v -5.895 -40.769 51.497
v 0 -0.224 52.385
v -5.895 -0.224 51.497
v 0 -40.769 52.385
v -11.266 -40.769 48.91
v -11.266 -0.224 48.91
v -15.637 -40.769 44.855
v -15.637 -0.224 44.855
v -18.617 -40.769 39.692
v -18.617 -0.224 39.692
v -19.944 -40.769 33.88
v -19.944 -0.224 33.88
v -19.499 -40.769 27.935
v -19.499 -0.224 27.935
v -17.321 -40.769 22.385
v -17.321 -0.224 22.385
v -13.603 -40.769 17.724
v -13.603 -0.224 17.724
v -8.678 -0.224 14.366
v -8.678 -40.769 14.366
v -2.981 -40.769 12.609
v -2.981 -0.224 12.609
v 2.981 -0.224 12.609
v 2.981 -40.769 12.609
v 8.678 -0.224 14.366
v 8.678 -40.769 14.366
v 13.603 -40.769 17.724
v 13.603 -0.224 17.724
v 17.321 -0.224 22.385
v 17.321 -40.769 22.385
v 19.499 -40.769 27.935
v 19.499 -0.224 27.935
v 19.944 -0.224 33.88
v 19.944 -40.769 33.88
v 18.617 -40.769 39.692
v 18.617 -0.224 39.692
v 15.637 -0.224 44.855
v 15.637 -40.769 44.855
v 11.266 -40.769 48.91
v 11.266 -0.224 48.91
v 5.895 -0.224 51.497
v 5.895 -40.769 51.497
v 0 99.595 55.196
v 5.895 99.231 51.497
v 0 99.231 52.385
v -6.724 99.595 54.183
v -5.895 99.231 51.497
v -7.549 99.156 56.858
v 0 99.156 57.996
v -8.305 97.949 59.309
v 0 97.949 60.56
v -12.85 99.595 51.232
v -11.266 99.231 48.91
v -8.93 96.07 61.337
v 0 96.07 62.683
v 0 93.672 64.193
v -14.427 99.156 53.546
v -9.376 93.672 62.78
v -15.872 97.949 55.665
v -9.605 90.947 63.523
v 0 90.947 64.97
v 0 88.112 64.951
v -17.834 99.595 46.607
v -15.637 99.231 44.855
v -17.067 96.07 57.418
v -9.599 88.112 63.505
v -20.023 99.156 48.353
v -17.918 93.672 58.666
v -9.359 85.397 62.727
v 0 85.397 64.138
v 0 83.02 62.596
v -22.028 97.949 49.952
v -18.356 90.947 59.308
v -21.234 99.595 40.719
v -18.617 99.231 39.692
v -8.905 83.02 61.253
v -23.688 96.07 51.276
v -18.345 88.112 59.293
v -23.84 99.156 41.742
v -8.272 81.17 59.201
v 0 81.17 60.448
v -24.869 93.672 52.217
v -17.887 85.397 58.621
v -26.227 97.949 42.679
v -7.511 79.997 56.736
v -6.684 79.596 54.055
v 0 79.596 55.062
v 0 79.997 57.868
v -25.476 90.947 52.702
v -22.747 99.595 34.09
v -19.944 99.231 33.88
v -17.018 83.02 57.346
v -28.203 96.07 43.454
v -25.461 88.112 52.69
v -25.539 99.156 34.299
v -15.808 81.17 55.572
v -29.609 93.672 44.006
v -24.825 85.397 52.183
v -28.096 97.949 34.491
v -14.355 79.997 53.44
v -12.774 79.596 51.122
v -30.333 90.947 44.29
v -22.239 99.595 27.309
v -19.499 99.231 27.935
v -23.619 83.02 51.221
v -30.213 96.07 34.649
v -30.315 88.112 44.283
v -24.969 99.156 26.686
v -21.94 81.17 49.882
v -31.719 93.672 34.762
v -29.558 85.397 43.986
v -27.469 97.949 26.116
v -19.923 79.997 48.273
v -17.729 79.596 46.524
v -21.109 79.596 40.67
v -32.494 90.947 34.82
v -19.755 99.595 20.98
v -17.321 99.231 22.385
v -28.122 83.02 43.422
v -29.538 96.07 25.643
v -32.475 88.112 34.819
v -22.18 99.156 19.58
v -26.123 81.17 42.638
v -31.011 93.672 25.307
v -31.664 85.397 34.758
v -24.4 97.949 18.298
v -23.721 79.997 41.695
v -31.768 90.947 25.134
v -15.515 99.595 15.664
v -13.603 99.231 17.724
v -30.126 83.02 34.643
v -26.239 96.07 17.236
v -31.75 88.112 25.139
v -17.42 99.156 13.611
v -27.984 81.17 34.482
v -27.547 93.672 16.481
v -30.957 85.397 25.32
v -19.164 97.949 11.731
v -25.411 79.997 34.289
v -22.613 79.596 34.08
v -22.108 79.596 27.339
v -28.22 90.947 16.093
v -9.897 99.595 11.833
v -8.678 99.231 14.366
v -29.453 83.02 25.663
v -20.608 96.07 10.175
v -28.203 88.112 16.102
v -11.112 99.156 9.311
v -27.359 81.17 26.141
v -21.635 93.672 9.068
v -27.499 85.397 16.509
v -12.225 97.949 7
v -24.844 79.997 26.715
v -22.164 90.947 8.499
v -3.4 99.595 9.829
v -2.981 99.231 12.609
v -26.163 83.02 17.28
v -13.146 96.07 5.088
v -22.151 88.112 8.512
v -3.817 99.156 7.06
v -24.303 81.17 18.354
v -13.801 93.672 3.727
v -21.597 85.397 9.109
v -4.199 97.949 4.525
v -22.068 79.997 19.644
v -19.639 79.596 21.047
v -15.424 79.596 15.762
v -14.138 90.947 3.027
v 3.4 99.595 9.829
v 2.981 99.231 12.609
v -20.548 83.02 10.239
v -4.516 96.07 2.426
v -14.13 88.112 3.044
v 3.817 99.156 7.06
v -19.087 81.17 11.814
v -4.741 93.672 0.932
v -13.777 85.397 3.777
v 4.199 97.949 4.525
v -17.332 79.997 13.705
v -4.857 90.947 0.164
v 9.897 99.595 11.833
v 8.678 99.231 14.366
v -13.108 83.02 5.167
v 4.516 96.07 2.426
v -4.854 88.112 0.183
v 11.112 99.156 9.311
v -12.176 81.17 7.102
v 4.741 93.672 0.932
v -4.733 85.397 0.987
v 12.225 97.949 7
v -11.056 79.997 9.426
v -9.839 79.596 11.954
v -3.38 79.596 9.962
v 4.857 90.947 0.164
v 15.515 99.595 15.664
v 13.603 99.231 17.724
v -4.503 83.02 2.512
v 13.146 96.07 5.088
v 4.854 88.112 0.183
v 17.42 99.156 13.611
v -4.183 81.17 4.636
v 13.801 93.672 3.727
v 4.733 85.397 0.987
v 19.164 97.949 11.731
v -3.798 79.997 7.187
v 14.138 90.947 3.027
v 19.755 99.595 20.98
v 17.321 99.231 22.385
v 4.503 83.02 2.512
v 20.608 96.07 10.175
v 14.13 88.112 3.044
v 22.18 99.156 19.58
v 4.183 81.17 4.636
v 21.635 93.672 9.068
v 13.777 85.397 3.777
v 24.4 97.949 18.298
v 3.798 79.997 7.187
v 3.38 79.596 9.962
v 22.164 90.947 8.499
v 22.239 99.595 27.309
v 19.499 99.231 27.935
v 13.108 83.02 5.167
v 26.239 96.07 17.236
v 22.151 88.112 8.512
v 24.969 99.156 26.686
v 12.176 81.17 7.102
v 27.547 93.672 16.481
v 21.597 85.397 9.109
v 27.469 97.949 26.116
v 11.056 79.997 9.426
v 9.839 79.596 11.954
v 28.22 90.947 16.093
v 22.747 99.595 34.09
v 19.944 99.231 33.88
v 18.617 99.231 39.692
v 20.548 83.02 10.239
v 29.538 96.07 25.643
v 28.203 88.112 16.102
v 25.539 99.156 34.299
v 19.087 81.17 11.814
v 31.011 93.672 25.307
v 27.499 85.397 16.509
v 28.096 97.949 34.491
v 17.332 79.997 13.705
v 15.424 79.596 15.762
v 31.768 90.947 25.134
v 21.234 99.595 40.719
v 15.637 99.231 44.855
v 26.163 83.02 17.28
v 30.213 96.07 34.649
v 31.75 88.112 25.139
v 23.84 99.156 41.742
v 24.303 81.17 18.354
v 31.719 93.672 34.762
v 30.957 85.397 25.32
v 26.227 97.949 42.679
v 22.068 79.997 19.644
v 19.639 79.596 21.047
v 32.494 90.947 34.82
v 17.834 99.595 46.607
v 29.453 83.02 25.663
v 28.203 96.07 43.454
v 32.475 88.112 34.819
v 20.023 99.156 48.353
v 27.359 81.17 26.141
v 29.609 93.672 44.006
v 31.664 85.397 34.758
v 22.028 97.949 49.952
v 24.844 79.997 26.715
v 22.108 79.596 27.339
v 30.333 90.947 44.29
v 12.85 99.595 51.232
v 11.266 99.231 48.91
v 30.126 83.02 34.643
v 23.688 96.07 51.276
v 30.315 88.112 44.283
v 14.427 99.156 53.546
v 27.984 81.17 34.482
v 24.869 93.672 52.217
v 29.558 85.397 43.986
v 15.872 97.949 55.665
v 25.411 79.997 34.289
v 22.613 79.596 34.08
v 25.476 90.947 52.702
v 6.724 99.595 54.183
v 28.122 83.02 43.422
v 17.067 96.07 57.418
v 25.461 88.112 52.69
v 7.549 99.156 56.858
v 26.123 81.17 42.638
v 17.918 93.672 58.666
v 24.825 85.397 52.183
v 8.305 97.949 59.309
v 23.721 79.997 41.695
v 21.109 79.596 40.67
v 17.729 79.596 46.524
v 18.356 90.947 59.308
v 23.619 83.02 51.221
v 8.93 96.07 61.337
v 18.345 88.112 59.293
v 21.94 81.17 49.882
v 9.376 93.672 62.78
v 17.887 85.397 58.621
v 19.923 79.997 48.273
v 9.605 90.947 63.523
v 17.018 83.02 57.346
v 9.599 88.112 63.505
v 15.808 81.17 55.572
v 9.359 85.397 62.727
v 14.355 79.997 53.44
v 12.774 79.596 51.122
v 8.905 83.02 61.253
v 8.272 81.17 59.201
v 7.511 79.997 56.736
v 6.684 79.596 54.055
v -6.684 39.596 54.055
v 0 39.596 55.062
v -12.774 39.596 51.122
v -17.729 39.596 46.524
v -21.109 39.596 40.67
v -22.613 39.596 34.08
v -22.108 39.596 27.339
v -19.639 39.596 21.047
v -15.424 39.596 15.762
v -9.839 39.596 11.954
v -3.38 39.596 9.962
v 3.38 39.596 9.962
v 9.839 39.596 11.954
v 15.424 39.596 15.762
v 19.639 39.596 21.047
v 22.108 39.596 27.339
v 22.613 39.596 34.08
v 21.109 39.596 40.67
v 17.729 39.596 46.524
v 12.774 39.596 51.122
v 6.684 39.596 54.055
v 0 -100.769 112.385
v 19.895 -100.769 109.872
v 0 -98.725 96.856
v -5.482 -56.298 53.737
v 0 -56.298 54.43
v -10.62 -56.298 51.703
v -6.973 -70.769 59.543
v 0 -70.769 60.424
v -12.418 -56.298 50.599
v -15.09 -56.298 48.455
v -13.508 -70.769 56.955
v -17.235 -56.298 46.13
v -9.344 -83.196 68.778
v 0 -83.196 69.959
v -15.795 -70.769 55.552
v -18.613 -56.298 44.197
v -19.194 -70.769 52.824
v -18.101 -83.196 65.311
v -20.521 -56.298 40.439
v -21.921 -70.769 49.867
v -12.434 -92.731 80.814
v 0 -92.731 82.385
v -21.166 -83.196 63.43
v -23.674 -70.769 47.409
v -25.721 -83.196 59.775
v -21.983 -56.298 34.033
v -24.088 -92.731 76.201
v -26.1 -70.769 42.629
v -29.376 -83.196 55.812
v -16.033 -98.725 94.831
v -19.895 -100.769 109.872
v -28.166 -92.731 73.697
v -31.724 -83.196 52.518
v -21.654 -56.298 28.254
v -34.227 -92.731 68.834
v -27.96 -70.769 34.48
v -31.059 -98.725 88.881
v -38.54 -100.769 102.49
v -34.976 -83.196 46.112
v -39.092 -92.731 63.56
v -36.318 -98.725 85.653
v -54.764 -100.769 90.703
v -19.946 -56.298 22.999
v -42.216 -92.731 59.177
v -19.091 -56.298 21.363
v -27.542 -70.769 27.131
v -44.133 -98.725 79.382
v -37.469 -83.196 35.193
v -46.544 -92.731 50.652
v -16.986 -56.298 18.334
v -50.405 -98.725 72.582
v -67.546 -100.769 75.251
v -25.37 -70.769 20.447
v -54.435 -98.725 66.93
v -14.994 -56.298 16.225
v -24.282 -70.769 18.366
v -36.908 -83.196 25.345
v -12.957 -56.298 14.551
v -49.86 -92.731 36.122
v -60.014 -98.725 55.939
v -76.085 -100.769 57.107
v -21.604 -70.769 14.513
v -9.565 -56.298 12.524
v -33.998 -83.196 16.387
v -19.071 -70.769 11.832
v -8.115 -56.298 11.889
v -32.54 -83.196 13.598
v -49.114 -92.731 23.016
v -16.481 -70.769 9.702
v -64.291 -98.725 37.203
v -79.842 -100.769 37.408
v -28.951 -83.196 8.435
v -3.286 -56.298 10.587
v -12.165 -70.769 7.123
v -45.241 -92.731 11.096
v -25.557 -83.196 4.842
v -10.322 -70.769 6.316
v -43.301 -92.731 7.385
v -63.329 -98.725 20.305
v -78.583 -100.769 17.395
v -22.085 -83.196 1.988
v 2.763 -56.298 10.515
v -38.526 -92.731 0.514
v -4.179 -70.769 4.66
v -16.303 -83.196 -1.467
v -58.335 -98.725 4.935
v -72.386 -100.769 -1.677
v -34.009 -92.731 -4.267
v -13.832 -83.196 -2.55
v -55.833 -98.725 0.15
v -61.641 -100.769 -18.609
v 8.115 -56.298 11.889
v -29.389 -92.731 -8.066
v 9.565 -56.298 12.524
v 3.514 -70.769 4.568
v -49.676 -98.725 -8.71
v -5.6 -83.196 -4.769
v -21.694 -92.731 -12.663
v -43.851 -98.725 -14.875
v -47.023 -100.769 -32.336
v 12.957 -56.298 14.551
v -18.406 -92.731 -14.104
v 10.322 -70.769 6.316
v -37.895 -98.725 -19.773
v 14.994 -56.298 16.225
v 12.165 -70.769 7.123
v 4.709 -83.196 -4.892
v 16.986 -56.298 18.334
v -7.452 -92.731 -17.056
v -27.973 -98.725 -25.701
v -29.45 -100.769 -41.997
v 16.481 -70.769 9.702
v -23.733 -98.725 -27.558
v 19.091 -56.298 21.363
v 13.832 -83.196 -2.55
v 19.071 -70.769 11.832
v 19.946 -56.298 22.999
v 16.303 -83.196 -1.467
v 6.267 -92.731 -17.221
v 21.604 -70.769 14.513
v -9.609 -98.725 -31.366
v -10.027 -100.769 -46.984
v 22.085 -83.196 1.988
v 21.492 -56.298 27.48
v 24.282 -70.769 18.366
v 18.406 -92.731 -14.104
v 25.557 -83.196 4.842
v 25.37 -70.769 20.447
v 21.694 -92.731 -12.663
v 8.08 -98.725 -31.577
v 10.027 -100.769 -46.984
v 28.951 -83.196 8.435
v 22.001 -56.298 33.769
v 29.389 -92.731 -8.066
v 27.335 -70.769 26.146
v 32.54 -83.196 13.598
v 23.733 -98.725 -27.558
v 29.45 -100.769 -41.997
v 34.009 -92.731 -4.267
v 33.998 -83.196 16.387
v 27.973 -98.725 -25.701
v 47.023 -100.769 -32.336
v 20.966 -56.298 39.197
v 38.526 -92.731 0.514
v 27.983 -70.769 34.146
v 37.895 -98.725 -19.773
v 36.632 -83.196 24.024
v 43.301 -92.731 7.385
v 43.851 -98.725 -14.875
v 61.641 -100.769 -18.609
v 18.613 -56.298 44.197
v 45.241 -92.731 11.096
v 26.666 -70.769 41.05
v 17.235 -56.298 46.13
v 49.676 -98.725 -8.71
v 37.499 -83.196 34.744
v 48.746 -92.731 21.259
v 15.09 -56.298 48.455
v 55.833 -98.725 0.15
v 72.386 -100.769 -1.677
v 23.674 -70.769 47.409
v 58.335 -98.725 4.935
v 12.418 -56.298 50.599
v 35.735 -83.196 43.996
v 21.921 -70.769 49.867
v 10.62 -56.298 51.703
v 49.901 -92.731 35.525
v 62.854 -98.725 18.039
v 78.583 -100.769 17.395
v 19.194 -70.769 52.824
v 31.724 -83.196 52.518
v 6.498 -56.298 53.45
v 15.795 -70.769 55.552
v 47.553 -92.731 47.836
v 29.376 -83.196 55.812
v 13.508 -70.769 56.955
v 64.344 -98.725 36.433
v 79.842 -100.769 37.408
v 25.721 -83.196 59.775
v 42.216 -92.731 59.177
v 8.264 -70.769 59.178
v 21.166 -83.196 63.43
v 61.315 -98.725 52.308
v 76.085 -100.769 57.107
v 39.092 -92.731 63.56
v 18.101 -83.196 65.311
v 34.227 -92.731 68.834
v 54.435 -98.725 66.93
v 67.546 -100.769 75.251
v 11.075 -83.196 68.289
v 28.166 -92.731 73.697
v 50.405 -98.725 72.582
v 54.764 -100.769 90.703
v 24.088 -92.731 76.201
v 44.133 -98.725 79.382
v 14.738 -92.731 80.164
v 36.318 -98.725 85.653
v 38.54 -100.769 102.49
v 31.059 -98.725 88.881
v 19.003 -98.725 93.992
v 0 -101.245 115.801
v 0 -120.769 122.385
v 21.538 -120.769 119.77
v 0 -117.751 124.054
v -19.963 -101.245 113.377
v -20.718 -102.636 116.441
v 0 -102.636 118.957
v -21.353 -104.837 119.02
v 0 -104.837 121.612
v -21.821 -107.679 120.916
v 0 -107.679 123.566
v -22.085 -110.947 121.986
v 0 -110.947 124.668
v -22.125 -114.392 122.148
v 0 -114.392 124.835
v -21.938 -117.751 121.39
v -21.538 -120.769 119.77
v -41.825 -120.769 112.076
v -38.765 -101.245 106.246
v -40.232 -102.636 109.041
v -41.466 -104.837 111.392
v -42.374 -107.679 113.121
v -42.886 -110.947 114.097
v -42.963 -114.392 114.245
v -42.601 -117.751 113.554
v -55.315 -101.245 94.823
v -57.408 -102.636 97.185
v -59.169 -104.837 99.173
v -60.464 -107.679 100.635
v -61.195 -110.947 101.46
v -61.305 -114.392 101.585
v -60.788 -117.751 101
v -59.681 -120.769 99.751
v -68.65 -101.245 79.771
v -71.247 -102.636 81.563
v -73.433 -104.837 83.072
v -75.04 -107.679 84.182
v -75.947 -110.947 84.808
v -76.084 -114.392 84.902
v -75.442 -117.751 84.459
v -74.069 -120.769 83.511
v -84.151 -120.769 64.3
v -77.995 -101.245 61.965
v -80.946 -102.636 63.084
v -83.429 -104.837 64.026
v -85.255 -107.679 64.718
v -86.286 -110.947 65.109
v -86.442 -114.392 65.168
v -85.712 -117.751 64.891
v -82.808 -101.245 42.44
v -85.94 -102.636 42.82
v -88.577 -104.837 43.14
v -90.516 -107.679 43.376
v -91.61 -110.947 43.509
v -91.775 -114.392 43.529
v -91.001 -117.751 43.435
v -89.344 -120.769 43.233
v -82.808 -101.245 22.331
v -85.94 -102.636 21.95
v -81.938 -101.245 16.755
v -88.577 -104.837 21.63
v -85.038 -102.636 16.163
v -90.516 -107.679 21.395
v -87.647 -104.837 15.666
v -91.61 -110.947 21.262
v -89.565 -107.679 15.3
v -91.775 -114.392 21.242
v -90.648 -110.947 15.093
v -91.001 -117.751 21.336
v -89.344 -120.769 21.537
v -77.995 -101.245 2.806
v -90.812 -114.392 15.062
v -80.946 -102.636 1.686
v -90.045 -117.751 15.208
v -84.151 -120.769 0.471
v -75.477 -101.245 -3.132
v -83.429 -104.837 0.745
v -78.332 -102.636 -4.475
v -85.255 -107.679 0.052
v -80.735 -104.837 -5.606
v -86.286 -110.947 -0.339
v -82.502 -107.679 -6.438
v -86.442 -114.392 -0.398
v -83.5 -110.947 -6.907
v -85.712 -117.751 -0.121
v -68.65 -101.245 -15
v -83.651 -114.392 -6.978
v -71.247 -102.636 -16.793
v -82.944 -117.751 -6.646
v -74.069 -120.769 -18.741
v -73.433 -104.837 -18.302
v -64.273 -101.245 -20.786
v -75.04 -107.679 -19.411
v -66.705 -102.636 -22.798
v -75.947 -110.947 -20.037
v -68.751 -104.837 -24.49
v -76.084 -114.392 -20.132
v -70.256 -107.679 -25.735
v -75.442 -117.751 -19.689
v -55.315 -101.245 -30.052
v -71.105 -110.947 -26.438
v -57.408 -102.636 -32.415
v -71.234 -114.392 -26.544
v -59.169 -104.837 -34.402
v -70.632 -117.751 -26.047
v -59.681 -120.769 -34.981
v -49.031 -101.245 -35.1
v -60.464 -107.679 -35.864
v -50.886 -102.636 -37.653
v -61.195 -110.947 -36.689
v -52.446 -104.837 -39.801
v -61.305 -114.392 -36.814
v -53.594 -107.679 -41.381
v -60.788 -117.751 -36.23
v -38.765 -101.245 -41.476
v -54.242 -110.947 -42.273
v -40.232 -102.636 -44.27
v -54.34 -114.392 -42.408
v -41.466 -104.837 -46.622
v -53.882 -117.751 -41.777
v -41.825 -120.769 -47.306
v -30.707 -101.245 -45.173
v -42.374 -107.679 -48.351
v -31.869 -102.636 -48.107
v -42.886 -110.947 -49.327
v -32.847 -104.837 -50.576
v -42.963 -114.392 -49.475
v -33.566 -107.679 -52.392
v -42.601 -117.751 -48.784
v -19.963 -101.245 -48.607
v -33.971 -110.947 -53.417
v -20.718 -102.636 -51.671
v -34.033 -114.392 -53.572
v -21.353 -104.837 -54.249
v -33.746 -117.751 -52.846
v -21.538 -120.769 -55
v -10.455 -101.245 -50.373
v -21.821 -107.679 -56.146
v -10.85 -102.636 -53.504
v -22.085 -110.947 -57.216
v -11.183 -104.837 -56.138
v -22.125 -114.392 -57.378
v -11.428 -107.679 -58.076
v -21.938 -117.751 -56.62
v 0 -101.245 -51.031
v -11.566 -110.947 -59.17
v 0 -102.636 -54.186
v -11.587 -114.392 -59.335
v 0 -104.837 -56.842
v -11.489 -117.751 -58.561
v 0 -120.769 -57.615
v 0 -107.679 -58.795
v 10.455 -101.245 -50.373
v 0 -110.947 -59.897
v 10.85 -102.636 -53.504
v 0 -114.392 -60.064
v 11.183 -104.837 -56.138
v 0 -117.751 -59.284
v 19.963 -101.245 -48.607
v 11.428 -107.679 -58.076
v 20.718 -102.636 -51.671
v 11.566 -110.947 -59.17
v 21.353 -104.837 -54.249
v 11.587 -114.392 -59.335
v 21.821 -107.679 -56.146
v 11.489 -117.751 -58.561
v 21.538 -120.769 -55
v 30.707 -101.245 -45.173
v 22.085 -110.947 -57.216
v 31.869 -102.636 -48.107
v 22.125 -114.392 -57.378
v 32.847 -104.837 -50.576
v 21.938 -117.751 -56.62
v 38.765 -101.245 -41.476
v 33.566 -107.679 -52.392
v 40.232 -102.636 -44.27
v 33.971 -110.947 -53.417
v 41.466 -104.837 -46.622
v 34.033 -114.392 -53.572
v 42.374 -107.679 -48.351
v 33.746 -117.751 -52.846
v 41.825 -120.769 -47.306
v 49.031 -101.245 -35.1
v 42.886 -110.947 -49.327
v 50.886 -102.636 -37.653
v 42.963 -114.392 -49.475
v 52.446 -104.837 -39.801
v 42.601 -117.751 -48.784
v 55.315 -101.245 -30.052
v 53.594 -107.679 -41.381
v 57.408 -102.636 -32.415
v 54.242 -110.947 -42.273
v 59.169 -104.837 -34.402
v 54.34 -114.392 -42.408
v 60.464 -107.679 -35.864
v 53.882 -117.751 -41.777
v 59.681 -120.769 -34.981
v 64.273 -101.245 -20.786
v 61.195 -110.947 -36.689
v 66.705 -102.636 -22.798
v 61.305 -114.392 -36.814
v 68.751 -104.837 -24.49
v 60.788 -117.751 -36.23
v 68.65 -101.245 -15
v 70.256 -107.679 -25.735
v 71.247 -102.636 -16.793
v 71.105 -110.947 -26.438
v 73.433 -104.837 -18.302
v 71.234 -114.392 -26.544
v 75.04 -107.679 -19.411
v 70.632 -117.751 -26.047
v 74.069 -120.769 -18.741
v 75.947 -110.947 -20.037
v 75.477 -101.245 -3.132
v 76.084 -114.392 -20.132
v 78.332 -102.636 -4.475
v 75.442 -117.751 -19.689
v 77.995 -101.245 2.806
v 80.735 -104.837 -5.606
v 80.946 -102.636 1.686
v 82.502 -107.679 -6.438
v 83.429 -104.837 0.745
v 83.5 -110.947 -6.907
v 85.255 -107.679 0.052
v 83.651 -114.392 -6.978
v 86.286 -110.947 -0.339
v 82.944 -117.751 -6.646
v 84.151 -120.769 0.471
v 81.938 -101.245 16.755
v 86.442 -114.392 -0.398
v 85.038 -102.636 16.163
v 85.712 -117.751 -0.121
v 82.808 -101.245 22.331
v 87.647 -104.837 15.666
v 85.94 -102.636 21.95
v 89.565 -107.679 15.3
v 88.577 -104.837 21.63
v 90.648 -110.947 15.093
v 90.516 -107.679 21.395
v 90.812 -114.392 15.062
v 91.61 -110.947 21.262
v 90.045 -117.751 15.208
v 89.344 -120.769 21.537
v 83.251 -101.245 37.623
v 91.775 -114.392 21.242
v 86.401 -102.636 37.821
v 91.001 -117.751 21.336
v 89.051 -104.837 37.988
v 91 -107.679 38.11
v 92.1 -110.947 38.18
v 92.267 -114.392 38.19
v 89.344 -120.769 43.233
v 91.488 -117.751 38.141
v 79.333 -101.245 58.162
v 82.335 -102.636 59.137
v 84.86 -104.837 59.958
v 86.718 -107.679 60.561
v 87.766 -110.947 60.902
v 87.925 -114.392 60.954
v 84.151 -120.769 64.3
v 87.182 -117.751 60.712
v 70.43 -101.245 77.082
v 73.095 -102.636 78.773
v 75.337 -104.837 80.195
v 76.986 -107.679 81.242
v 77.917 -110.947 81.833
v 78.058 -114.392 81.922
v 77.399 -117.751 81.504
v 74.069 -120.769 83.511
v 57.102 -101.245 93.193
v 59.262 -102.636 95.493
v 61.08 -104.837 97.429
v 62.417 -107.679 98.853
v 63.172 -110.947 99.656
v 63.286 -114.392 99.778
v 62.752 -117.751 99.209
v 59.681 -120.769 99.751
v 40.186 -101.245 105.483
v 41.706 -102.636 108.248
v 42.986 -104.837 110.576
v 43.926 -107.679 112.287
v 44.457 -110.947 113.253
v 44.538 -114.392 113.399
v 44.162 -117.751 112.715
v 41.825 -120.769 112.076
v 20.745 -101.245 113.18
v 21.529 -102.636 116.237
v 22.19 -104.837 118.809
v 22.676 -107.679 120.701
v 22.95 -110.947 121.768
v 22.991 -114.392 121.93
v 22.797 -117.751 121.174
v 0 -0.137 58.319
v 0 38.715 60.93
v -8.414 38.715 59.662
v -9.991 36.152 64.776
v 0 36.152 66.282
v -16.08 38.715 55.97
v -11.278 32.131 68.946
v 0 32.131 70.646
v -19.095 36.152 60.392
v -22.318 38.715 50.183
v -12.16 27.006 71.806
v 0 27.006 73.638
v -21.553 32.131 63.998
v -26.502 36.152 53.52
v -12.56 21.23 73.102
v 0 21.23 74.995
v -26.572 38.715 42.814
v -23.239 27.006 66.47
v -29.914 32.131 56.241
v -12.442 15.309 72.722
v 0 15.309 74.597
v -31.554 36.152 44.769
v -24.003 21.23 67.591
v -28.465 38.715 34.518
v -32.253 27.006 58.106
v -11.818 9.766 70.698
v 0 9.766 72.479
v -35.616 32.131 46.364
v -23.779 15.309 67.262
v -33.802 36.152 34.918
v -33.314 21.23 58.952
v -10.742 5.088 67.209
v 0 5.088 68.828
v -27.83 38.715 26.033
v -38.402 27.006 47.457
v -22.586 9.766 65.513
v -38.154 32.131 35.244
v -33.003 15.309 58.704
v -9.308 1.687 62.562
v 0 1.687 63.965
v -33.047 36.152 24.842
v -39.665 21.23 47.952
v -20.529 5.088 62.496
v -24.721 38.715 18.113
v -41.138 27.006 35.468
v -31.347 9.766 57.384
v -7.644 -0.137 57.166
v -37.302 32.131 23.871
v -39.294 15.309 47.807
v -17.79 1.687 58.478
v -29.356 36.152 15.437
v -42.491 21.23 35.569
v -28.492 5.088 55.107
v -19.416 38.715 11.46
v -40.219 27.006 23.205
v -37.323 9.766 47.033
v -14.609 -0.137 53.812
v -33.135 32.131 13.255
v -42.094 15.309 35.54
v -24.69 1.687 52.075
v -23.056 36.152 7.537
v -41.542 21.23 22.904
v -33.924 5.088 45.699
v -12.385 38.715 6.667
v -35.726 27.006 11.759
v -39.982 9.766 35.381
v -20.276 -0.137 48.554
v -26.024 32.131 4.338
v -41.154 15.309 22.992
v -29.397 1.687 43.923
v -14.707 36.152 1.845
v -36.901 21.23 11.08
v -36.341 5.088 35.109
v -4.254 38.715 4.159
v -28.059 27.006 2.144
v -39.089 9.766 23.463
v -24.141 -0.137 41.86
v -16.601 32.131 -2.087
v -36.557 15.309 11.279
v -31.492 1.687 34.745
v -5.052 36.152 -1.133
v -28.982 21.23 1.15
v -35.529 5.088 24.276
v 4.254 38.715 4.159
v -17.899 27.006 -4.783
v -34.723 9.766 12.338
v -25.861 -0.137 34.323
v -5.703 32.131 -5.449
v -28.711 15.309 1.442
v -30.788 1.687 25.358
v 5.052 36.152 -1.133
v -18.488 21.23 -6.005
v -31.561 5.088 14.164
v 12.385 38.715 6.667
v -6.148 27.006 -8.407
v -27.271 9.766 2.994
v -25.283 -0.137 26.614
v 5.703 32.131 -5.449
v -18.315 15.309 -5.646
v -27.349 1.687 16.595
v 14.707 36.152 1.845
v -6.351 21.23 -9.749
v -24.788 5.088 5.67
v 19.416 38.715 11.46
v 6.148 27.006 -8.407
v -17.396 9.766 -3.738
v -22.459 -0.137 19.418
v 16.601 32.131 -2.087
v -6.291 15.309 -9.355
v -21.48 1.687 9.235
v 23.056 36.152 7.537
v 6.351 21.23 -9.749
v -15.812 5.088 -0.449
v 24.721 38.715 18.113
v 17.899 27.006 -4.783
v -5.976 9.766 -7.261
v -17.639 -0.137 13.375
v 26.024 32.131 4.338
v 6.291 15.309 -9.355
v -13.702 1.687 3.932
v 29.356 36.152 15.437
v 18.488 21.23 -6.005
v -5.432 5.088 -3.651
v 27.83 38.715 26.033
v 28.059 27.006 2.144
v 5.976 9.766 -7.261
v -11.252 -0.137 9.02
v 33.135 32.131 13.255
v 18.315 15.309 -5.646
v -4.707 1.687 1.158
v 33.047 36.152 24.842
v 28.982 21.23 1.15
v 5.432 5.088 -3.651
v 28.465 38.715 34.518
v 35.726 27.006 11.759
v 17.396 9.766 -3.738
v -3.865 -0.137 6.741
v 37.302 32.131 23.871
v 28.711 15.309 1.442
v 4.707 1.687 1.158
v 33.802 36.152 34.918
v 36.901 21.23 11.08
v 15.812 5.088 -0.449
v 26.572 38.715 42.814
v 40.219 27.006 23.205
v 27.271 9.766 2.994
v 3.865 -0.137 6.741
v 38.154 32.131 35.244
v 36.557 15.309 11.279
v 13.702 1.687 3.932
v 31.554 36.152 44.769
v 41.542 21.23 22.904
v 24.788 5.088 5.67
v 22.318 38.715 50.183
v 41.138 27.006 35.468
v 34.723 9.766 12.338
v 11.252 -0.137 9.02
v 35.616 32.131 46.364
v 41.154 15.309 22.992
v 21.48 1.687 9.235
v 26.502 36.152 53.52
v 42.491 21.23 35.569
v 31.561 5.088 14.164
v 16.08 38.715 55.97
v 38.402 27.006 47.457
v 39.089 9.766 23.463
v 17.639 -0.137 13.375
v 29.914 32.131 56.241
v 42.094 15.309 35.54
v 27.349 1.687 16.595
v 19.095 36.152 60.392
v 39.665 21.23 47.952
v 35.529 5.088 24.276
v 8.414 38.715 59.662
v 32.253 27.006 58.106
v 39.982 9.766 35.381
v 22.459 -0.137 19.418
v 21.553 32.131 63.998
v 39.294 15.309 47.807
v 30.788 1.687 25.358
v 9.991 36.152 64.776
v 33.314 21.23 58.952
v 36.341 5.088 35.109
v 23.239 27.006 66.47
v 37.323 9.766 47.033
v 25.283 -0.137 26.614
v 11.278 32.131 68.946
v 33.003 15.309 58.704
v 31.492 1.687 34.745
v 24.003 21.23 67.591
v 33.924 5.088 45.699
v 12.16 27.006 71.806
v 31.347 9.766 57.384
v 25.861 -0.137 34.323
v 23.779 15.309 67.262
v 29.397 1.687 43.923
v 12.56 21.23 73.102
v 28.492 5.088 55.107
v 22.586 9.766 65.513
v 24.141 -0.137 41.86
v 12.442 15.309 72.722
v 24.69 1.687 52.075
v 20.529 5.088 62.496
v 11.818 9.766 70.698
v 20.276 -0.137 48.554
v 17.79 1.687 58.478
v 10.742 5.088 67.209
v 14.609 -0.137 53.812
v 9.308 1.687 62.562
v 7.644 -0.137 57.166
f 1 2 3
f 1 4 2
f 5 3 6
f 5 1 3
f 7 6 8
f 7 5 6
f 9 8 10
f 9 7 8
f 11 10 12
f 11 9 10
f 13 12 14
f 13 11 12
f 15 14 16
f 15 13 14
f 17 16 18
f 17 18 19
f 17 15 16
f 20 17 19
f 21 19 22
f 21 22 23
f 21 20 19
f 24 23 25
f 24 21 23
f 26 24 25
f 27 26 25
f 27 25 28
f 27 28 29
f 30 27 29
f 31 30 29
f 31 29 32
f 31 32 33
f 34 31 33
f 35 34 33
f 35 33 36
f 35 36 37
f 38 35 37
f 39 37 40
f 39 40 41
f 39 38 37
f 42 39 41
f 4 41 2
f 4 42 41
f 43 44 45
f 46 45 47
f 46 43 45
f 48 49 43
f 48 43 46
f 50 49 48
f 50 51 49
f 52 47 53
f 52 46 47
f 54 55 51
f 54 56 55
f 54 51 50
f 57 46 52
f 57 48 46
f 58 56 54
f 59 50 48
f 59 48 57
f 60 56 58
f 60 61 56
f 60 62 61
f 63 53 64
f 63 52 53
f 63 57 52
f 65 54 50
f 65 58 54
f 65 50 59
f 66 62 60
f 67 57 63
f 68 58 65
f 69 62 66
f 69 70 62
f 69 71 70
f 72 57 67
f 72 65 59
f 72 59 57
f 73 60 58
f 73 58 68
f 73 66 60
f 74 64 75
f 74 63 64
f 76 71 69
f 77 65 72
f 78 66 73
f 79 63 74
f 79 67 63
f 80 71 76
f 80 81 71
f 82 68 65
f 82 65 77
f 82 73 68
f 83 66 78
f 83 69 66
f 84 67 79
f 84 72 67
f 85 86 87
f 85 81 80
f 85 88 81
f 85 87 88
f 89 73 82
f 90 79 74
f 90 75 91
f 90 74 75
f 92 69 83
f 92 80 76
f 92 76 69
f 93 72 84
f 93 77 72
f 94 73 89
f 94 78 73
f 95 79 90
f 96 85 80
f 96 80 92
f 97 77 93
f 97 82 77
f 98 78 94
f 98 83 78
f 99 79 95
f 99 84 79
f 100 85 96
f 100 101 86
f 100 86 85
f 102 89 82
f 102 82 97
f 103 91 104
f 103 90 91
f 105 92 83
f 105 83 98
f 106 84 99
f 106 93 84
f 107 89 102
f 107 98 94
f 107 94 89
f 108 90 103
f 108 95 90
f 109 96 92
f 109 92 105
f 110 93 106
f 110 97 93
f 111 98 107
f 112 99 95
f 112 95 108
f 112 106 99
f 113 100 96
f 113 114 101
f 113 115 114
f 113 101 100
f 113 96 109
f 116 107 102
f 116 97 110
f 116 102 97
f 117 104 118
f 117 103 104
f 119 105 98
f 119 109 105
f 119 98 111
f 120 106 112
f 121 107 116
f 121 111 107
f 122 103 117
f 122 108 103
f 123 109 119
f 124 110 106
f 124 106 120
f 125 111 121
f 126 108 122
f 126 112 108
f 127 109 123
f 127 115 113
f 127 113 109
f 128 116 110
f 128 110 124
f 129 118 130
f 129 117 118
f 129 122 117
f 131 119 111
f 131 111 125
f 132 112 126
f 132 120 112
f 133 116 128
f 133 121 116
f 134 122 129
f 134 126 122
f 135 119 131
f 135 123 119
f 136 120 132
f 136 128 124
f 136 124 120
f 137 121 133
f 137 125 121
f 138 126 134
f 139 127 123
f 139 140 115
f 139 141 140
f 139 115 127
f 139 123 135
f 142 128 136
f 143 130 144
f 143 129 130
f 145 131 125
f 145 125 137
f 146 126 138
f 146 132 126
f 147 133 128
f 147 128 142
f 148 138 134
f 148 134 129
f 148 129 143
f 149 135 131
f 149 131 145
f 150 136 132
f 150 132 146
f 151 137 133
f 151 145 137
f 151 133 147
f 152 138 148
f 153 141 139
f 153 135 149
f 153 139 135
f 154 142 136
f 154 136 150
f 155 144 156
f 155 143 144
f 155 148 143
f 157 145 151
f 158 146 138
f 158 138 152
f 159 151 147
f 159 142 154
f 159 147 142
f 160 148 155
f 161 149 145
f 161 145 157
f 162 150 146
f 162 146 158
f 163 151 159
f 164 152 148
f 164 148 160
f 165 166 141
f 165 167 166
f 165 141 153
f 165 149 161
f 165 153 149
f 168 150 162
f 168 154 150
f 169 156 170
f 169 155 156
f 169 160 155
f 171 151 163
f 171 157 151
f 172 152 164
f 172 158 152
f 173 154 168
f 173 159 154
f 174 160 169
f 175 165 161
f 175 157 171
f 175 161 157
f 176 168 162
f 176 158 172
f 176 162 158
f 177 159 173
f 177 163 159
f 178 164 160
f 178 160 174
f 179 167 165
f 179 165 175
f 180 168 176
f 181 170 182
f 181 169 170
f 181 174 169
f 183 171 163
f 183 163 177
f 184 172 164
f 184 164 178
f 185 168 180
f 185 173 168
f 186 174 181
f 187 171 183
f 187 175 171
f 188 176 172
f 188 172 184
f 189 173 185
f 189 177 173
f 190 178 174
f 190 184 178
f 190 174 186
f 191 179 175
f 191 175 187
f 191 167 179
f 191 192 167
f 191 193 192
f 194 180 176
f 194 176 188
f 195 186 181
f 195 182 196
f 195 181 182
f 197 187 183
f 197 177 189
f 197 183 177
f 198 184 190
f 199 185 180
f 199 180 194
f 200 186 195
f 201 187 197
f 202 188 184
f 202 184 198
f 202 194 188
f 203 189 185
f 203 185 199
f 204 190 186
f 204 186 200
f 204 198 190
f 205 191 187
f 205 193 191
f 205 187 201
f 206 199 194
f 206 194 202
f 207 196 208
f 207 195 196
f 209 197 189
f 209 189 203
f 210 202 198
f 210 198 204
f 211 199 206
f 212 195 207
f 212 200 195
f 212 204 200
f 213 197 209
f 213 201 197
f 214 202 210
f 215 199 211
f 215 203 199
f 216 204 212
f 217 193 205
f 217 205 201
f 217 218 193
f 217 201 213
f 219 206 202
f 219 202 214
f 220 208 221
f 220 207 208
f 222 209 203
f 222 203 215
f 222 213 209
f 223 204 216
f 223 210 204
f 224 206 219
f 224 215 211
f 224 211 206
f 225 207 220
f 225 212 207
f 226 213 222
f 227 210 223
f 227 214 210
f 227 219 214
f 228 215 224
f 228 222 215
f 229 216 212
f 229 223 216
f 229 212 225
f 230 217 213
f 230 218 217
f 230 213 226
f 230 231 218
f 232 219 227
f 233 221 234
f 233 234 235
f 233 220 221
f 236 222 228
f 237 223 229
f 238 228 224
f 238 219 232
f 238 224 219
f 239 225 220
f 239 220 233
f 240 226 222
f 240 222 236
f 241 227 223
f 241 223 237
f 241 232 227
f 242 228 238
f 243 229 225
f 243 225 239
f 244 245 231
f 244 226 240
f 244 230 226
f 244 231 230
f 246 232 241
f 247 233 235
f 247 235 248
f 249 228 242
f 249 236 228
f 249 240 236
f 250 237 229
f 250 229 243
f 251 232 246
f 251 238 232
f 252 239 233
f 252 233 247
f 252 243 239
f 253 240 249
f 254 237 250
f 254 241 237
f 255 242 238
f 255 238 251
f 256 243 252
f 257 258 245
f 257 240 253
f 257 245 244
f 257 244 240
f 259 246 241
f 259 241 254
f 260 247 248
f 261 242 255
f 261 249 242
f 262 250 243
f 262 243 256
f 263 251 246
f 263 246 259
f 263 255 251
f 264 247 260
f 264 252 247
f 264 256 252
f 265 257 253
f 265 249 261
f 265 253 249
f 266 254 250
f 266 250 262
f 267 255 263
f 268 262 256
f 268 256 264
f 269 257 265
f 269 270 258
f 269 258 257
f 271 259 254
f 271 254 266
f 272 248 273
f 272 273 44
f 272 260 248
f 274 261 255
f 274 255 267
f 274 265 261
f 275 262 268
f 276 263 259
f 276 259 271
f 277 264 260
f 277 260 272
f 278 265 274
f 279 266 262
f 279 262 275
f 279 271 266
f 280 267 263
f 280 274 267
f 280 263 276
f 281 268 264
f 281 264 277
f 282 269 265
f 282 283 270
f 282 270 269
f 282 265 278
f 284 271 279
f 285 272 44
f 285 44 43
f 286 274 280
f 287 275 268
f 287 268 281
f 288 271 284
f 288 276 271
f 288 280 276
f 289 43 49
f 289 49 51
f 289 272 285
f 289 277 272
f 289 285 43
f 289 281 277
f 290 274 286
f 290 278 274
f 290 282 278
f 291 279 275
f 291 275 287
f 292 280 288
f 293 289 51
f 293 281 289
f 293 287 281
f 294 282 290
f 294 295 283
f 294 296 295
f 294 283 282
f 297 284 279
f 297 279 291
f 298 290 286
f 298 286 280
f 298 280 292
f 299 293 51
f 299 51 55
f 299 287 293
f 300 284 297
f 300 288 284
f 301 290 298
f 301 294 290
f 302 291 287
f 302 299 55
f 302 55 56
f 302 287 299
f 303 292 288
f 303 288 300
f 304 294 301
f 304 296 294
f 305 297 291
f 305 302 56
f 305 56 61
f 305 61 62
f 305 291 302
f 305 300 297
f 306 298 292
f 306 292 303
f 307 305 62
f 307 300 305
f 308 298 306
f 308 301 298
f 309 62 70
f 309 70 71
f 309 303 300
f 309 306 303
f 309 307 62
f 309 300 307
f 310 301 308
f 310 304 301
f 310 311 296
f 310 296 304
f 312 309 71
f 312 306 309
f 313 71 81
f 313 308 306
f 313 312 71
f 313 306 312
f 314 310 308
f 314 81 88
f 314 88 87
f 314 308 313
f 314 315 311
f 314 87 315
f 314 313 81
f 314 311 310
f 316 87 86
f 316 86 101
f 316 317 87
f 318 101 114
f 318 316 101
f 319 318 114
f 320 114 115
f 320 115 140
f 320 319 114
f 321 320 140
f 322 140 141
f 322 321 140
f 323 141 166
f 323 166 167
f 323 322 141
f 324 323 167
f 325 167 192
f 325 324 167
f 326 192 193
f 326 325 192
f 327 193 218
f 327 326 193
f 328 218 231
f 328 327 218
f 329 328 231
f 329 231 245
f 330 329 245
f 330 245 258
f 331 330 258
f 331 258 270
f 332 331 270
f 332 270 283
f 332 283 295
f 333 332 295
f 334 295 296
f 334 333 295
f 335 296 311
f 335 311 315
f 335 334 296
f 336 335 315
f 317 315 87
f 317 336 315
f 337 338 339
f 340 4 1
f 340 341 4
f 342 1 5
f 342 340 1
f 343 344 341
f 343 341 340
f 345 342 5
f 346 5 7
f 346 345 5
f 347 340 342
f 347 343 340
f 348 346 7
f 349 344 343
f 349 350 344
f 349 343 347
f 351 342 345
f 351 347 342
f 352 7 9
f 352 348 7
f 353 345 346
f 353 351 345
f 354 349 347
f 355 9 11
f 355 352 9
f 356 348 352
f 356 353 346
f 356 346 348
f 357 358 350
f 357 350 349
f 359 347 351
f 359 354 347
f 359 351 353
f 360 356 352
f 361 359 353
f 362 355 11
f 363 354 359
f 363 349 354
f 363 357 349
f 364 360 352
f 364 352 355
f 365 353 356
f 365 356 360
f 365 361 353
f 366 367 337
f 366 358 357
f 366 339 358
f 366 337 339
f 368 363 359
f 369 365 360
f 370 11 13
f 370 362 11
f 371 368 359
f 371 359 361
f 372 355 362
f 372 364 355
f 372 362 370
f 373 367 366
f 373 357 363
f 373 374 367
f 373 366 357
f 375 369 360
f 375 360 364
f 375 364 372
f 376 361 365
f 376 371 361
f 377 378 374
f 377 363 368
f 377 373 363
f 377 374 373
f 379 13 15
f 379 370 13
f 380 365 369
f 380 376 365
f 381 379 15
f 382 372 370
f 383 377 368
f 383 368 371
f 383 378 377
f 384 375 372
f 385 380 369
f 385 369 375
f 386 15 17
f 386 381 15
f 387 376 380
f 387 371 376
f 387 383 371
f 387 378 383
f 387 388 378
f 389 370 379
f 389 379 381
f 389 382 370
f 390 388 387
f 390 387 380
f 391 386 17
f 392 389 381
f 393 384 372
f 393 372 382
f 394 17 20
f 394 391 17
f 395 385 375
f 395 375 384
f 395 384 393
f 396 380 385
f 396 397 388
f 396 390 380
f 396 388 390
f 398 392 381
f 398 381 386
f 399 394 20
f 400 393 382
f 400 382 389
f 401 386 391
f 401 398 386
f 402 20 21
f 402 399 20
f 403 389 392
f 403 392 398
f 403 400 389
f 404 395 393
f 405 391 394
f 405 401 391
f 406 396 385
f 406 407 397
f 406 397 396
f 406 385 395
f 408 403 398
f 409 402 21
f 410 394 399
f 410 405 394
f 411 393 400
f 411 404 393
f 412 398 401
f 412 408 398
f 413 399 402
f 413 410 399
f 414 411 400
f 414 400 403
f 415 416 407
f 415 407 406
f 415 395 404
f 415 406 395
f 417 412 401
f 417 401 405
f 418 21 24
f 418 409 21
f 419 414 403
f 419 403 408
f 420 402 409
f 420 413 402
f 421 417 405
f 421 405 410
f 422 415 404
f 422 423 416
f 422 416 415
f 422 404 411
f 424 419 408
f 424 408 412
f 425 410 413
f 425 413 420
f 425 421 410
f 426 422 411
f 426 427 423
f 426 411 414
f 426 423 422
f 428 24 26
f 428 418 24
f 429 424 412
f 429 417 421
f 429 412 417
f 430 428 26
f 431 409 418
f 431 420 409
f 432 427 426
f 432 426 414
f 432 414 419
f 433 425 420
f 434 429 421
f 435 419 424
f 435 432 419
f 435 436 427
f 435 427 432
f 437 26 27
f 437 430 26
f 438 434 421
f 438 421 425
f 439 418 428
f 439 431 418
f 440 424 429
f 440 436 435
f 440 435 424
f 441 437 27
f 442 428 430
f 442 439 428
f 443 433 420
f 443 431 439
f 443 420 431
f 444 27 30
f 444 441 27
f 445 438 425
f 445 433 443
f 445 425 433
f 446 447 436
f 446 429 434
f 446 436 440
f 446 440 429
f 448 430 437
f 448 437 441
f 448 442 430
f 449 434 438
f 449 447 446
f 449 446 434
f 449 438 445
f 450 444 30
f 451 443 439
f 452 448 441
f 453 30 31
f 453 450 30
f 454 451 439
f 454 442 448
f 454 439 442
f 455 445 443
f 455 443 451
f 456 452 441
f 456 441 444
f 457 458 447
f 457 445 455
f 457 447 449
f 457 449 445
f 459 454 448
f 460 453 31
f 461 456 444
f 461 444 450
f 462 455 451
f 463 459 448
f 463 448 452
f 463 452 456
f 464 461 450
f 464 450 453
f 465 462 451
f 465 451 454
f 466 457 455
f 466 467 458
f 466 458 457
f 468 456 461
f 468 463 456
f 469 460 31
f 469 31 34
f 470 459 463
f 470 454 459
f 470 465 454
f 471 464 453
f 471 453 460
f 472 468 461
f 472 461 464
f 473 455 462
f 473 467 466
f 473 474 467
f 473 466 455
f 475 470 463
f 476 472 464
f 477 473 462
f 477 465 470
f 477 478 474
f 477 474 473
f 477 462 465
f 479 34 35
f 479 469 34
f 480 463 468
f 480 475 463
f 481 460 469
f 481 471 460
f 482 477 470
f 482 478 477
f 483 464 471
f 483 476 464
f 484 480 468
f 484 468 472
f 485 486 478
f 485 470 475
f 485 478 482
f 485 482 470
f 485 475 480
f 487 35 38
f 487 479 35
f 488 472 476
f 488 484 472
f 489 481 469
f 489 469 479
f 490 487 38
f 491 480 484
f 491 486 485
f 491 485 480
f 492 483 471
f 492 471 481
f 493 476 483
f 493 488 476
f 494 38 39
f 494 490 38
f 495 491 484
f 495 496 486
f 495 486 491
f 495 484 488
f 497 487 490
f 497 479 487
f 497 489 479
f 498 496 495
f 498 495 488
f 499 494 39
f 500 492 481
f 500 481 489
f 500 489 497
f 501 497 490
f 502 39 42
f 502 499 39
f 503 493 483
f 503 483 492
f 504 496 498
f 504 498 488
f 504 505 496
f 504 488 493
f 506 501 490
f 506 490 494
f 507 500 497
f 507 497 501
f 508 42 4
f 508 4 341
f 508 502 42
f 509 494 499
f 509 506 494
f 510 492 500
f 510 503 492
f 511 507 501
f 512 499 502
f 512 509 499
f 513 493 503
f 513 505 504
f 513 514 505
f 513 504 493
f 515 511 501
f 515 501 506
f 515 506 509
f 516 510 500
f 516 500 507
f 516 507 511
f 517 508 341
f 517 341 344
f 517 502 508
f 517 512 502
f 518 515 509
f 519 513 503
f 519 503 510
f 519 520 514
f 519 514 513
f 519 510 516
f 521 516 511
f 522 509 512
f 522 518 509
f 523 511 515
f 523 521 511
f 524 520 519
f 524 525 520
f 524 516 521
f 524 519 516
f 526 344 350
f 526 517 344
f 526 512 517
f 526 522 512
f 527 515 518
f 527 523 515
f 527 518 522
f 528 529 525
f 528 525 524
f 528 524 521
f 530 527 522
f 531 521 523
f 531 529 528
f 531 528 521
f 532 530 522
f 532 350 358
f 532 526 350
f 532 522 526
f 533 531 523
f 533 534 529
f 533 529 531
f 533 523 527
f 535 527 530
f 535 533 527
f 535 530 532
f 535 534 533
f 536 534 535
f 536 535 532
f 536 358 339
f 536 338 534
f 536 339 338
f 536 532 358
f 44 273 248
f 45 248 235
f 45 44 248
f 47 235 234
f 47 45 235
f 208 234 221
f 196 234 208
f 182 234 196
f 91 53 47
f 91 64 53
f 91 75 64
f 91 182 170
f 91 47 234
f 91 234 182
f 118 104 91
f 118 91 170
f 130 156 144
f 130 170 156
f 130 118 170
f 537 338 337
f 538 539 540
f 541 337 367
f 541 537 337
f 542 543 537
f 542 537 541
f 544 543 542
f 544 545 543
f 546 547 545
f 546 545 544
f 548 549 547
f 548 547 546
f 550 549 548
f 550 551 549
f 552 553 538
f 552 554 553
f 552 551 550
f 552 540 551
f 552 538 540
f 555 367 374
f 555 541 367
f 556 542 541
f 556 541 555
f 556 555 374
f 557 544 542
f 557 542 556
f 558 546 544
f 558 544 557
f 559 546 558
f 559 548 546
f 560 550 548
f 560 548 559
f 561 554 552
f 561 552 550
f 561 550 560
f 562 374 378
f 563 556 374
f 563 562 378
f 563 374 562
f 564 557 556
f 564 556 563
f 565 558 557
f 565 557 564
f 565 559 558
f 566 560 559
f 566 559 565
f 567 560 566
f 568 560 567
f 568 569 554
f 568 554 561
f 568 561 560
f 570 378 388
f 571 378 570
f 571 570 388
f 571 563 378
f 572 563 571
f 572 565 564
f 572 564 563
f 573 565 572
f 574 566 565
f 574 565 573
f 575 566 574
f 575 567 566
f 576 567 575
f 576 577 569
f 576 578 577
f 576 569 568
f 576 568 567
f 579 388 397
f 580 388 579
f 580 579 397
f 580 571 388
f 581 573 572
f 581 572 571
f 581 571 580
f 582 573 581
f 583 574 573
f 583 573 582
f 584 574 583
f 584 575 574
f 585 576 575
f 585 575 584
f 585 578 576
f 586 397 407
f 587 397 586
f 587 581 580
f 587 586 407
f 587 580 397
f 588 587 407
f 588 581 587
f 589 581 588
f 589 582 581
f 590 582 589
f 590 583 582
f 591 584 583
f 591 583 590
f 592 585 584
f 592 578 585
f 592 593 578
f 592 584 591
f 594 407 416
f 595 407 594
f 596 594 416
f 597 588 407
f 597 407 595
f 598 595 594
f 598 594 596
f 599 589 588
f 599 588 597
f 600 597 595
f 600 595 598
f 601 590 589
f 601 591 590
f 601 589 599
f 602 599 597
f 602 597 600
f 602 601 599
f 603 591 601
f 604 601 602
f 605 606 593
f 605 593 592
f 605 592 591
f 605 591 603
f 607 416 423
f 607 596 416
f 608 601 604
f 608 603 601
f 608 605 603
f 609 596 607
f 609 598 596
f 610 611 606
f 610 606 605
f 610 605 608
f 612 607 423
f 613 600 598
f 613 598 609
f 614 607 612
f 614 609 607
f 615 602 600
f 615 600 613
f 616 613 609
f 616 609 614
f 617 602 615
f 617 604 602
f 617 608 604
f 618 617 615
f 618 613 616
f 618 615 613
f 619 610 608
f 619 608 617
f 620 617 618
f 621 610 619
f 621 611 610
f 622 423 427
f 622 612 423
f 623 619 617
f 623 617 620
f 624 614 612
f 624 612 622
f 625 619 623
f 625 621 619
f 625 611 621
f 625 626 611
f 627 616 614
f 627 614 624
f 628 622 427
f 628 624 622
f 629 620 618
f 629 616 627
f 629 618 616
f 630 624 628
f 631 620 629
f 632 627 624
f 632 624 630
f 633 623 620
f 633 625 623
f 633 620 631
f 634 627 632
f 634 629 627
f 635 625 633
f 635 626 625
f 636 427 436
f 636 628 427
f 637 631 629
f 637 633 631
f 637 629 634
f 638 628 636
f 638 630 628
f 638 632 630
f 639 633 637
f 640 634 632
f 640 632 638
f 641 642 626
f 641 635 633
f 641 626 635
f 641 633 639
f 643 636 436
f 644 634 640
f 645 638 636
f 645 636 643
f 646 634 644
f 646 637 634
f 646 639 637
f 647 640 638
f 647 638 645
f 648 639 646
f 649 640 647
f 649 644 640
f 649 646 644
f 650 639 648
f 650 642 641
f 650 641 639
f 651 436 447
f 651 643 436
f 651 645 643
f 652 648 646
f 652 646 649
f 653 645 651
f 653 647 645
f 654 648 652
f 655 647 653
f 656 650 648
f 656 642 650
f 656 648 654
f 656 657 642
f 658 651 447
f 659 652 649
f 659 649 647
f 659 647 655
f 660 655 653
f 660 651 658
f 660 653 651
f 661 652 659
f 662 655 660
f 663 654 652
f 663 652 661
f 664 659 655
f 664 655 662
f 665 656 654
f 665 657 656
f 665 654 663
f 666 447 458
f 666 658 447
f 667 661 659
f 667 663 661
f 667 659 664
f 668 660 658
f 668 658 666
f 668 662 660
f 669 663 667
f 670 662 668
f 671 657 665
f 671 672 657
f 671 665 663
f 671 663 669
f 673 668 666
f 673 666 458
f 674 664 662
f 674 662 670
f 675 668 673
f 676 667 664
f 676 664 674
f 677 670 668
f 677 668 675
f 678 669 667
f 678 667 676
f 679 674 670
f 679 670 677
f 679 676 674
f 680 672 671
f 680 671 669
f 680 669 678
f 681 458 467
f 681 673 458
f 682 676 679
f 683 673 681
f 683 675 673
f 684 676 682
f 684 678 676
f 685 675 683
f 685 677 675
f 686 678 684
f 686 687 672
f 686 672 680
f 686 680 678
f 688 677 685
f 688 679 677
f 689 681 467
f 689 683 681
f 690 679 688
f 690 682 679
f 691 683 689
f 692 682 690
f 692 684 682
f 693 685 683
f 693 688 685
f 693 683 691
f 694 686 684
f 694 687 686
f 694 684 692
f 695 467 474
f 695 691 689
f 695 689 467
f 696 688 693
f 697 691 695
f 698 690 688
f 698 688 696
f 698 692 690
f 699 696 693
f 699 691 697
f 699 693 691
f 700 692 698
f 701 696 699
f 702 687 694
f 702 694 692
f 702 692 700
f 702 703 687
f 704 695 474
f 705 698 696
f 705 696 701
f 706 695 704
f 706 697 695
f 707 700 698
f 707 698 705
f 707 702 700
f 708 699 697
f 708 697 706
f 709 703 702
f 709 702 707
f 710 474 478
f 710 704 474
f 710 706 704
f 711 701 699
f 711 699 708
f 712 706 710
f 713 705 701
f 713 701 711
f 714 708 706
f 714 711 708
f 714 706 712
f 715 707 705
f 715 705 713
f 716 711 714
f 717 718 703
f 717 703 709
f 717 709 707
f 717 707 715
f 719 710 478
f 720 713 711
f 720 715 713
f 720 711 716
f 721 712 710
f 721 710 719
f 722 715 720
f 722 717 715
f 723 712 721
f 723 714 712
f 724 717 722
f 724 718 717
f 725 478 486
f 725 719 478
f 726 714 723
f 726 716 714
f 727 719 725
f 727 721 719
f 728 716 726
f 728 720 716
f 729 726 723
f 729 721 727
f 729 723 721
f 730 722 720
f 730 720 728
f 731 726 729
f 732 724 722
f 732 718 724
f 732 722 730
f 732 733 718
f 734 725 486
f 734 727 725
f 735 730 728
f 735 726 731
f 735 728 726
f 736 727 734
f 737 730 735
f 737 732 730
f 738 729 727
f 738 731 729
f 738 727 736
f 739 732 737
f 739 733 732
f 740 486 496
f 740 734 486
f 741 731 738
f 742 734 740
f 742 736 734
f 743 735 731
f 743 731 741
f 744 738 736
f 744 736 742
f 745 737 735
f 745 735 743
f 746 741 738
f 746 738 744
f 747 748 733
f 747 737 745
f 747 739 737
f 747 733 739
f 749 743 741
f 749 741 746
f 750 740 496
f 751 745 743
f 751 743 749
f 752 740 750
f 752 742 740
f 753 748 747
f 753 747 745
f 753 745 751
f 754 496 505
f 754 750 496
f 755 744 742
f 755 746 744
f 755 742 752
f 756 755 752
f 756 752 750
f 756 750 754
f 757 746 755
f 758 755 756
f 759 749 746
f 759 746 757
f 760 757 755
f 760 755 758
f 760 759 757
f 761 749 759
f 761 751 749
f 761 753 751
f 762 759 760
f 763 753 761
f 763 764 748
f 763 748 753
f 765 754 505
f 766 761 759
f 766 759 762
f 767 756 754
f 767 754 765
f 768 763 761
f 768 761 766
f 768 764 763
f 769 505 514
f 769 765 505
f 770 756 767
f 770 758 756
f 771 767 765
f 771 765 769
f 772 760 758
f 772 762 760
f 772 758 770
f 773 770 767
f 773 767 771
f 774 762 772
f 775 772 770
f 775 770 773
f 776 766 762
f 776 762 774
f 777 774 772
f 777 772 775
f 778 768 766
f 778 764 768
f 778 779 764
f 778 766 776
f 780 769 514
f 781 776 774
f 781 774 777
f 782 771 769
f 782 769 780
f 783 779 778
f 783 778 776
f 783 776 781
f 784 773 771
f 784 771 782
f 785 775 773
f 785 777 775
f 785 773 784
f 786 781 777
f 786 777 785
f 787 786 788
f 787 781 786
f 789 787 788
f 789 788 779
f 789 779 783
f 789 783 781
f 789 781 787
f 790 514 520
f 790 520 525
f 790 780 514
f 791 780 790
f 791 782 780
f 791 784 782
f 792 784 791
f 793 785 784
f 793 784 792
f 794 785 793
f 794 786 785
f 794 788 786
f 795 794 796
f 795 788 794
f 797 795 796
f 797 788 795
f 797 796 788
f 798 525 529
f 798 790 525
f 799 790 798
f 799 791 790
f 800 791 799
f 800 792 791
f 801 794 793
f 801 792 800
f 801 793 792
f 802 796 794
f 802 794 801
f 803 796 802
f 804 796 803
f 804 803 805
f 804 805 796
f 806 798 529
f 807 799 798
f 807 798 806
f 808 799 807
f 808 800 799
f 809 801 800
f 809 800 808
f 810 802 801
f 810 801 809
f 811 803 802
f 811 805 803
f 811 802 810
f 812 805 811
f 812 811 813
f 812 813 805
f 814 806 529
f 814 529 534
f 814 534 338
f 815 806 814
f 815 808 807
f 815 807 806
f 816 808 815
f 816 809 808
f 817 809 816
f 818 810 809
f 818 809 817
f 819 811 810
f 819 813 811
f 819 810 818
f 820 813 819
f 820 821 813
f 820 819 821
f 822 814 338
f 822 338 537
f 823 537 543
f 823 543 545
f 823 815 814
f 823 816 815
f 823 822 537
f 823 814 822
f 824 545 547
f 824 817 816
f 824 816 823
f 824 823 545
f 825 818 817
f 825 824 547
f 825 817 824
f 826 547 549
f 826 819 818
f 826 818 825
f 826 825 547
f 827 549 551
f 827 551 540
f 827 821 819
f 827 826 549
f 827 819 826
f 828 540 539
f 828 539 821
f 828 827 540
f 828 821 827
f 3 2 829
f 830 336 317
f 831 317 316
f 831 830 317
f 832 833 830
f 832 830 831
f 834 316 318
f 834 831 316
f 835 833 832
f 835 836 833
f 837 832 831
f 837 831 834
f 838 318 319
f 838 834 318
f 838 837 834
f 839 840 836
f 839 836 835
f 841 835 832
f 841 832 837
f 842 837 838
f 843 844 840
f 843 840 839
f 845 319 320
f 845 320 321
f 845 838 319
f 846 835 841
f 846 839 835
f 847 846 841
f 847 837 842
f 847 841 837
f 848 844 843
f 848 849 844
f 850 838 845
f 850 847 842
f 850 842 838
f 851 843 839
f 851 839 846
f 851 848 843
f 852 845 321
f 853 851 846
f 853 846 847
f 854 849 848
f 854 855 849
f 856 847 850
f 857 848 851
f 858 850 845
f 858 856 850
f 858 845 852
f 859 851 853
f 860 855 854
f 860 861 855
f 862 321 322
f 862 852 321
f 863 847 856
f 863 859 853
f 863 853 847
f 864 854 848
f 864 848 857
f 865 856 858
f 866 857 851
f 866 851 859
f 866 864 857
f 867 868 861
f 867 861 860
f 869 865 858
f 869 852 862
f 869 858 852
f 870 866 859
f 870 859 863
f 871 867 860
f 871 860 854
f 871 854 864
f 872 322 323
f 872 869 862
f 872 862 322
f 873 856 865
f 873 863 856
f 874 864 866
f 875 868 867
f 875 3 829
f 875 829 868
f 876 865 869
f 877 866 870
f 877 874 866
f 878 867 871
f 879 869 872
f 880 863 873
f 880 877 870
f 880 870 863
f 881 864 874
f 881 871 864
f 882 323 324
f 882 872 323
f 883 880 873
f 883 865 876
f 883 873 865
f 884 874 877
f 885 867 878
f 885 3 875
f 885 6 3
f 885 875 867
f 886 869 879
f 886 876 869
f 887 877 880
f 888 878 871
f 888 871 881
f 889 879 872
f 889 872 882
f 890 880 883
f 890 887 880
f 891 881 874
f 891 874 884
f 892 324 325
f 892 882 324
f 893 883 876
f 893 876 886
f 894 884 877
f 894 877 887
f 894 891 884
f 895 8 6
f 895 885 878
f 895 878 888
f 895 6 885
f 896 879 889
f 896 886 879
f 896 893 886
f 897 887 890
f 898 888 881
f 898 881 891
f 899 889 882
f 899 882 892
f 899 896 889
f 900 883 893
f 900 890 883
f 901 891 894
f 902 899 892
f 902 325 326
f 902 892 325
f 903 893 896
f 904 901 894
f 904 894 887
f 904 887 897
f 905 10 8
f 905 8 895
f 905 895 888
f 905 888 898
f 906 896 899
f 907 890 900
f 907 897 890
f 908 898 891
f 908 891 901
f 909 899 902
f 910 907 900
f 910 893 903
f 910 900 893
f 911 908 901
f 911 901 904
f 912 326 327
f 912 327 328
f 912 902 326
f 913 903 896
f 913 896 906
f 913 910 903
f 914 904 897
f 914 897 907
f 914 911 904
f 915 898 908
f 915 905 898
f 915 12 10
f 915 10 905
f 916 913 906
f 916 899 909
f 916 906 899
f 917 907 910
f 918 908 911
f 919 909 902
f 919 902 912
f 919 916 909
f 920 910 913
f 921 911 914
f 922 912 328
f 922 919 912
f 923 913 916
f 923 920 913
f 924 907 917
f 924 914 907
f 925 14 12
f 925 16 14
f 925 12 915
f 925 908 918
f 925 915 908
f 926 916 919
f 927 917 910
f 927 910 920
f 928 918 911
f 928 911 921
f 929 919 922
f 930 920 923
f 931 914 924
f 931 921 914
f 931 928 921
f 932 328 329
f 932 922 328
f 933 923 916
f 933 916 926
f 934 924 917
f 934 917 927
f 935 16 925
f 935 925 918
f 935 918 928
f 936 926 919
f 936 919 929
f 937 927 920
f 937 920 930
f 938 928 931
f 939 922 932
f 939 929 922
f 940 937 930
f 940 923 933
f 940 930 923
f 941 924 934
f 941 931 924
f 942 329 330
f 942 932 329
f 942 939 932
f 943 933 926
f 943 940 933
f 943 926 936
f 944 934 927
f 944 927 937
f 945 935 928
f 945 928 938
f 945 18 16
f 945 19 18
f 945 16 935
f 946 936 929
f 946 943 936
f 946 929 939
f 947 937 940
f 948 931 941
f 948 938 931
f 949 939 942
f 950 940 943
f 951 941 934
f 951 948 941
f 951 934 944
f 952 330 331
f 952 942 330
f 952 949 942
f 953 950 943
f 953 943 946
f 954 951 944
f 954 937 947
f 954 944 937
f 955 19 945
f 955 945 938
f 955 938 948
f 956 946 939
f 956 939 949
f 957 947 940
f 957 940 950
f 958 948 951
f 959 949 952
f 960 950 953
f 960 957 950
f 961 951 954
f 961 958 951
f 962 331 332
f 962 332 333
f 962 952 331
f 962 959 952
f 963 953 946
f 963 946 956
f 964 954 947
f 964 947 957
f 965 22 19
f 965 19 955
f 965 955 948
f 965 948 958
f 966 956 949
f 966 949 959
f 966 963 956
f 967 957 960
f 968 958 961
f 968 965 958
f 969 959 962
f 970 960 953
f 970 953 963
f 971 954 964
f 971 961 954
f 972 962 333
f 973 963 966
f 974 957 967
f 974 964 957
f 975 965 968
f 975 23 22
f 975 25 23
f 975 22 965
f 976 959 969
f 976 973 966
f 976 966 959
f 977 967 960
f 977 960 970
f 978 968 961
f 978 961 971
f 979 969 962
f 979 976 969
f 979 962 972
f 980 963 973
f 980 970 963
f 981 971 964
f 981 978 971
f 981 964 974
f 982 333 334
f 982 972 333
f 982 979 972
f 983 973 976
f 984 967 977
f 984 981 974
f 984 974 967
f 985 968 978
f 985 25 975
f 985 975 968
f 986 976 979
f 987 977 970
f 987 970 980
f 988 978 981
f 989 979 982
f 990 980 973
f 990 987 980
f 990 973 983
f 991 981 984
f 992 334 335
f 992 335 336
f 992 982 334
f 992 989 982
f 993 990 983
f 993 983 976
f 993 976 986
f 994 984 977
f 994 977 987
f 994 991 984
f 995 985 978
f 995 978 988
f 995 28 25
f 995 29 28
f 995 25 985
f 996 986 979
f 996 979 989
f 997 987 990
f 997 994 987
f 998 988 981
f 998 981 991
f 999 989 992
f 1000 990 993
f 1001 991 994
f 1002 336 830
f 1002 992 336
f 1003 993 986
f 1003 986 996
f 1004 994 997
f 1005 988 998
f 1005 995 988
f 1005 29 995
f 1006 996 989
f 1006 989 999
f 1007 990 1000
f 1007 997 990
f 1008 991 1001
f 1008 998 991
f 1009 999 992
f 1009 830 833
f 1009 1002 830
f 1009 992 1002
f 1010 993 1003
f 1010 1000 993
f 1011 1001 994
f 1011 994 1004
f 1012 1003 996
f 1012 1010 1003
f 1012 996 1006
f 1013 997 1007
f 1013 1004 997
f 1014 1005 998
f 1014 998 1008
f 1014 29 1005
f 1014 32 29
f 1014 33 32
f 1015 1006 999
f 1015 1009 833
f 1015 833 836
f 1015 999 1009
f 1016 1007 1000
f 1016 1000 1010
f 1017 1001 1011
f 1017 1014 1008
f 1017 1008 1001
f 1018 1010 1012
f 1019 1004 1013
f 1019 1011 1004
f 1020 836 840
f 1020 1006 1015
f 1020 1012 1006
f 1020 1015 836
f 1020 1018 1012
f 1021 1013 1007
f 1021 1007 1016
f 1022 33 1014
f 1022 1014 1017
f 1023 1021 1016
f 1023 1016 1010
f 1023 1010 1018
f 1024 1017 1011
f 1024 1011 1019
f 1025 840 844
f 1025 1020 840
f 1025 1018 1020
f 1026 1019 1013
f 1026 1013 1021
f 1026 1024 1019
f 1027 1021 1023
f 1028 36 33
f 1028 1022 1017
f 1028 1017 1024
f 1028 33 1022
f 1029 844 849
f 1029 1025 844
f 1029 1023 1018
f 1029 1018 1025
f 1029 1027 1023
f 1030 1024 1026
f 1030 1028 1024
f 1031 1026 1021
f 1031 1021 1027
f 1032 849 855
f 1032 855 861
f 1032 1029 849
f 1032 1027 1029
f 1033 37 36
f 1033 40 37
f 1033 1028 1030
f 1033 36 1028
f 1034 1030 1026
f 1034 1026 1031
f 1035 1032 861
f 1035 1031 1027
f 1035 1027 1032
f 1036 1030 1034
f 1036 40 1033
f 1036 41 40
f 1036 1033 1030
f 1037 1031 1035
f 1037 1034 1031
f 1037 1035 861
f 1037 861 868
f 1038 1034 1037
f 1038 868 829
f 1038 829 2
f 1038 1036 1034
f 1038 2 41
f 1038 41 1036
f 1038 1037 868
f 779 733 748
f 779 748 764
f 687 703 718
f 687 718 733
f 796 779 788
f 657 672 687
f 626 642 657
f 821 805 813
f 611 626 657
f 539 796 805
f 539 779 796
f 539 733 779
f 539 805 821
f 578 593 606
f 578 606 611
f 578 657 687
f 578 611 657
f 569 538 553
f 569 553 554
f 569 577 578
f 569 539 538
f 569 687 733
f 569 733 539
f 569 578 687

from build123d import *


with BuildPart() as part:
    # Sketch1 → Revolve1 (revolve)
    with BuildSketch(Plane(origin=(0, 0, 0), x_dir=(0, 0, -1), z_dir=(1, 0, 0))):
        with BuildLine():
            Line((-55.061986557, 79.595805047), (-55.061986557, 39.595805047))
            ThreePointArc((-55.061986557, 39.595805047), (-75.016950242, 18.254378823), (-52.385175398, -0.224252521))
            Line((-52.385175398, -0.224252521), (-52.385175398, -40.769119342))
            ThreePointArc((-52.385175398, -40.769119342), (-69.958768526, -83.195526213), (-112.385175398, -100.769119342))
            ThreePointArc((-112.385175398, -100.769119342), (-123.565515285, -107.678949398), (-122.385175398, -120.769119342))
            Line((-122.385175398, -120.769119342), (-32.385175398, -120.769119342))
            Line((-32.385175398, -120.769119342), (-32.385175398, 99.230880658))
            Line((-32.385175398, 99.230880658), (-52.385175398, 99.230880658))
            ThreePointArc((-52.385175398, 99.230880658), (-64.970335463, 90.946590726), (-55.061986557, 79.595805047))
        make_face()
    revolve(axis=Axis((0, 99.230880658, 32.385175398), (0, -1, 0)))


solid = part.part
